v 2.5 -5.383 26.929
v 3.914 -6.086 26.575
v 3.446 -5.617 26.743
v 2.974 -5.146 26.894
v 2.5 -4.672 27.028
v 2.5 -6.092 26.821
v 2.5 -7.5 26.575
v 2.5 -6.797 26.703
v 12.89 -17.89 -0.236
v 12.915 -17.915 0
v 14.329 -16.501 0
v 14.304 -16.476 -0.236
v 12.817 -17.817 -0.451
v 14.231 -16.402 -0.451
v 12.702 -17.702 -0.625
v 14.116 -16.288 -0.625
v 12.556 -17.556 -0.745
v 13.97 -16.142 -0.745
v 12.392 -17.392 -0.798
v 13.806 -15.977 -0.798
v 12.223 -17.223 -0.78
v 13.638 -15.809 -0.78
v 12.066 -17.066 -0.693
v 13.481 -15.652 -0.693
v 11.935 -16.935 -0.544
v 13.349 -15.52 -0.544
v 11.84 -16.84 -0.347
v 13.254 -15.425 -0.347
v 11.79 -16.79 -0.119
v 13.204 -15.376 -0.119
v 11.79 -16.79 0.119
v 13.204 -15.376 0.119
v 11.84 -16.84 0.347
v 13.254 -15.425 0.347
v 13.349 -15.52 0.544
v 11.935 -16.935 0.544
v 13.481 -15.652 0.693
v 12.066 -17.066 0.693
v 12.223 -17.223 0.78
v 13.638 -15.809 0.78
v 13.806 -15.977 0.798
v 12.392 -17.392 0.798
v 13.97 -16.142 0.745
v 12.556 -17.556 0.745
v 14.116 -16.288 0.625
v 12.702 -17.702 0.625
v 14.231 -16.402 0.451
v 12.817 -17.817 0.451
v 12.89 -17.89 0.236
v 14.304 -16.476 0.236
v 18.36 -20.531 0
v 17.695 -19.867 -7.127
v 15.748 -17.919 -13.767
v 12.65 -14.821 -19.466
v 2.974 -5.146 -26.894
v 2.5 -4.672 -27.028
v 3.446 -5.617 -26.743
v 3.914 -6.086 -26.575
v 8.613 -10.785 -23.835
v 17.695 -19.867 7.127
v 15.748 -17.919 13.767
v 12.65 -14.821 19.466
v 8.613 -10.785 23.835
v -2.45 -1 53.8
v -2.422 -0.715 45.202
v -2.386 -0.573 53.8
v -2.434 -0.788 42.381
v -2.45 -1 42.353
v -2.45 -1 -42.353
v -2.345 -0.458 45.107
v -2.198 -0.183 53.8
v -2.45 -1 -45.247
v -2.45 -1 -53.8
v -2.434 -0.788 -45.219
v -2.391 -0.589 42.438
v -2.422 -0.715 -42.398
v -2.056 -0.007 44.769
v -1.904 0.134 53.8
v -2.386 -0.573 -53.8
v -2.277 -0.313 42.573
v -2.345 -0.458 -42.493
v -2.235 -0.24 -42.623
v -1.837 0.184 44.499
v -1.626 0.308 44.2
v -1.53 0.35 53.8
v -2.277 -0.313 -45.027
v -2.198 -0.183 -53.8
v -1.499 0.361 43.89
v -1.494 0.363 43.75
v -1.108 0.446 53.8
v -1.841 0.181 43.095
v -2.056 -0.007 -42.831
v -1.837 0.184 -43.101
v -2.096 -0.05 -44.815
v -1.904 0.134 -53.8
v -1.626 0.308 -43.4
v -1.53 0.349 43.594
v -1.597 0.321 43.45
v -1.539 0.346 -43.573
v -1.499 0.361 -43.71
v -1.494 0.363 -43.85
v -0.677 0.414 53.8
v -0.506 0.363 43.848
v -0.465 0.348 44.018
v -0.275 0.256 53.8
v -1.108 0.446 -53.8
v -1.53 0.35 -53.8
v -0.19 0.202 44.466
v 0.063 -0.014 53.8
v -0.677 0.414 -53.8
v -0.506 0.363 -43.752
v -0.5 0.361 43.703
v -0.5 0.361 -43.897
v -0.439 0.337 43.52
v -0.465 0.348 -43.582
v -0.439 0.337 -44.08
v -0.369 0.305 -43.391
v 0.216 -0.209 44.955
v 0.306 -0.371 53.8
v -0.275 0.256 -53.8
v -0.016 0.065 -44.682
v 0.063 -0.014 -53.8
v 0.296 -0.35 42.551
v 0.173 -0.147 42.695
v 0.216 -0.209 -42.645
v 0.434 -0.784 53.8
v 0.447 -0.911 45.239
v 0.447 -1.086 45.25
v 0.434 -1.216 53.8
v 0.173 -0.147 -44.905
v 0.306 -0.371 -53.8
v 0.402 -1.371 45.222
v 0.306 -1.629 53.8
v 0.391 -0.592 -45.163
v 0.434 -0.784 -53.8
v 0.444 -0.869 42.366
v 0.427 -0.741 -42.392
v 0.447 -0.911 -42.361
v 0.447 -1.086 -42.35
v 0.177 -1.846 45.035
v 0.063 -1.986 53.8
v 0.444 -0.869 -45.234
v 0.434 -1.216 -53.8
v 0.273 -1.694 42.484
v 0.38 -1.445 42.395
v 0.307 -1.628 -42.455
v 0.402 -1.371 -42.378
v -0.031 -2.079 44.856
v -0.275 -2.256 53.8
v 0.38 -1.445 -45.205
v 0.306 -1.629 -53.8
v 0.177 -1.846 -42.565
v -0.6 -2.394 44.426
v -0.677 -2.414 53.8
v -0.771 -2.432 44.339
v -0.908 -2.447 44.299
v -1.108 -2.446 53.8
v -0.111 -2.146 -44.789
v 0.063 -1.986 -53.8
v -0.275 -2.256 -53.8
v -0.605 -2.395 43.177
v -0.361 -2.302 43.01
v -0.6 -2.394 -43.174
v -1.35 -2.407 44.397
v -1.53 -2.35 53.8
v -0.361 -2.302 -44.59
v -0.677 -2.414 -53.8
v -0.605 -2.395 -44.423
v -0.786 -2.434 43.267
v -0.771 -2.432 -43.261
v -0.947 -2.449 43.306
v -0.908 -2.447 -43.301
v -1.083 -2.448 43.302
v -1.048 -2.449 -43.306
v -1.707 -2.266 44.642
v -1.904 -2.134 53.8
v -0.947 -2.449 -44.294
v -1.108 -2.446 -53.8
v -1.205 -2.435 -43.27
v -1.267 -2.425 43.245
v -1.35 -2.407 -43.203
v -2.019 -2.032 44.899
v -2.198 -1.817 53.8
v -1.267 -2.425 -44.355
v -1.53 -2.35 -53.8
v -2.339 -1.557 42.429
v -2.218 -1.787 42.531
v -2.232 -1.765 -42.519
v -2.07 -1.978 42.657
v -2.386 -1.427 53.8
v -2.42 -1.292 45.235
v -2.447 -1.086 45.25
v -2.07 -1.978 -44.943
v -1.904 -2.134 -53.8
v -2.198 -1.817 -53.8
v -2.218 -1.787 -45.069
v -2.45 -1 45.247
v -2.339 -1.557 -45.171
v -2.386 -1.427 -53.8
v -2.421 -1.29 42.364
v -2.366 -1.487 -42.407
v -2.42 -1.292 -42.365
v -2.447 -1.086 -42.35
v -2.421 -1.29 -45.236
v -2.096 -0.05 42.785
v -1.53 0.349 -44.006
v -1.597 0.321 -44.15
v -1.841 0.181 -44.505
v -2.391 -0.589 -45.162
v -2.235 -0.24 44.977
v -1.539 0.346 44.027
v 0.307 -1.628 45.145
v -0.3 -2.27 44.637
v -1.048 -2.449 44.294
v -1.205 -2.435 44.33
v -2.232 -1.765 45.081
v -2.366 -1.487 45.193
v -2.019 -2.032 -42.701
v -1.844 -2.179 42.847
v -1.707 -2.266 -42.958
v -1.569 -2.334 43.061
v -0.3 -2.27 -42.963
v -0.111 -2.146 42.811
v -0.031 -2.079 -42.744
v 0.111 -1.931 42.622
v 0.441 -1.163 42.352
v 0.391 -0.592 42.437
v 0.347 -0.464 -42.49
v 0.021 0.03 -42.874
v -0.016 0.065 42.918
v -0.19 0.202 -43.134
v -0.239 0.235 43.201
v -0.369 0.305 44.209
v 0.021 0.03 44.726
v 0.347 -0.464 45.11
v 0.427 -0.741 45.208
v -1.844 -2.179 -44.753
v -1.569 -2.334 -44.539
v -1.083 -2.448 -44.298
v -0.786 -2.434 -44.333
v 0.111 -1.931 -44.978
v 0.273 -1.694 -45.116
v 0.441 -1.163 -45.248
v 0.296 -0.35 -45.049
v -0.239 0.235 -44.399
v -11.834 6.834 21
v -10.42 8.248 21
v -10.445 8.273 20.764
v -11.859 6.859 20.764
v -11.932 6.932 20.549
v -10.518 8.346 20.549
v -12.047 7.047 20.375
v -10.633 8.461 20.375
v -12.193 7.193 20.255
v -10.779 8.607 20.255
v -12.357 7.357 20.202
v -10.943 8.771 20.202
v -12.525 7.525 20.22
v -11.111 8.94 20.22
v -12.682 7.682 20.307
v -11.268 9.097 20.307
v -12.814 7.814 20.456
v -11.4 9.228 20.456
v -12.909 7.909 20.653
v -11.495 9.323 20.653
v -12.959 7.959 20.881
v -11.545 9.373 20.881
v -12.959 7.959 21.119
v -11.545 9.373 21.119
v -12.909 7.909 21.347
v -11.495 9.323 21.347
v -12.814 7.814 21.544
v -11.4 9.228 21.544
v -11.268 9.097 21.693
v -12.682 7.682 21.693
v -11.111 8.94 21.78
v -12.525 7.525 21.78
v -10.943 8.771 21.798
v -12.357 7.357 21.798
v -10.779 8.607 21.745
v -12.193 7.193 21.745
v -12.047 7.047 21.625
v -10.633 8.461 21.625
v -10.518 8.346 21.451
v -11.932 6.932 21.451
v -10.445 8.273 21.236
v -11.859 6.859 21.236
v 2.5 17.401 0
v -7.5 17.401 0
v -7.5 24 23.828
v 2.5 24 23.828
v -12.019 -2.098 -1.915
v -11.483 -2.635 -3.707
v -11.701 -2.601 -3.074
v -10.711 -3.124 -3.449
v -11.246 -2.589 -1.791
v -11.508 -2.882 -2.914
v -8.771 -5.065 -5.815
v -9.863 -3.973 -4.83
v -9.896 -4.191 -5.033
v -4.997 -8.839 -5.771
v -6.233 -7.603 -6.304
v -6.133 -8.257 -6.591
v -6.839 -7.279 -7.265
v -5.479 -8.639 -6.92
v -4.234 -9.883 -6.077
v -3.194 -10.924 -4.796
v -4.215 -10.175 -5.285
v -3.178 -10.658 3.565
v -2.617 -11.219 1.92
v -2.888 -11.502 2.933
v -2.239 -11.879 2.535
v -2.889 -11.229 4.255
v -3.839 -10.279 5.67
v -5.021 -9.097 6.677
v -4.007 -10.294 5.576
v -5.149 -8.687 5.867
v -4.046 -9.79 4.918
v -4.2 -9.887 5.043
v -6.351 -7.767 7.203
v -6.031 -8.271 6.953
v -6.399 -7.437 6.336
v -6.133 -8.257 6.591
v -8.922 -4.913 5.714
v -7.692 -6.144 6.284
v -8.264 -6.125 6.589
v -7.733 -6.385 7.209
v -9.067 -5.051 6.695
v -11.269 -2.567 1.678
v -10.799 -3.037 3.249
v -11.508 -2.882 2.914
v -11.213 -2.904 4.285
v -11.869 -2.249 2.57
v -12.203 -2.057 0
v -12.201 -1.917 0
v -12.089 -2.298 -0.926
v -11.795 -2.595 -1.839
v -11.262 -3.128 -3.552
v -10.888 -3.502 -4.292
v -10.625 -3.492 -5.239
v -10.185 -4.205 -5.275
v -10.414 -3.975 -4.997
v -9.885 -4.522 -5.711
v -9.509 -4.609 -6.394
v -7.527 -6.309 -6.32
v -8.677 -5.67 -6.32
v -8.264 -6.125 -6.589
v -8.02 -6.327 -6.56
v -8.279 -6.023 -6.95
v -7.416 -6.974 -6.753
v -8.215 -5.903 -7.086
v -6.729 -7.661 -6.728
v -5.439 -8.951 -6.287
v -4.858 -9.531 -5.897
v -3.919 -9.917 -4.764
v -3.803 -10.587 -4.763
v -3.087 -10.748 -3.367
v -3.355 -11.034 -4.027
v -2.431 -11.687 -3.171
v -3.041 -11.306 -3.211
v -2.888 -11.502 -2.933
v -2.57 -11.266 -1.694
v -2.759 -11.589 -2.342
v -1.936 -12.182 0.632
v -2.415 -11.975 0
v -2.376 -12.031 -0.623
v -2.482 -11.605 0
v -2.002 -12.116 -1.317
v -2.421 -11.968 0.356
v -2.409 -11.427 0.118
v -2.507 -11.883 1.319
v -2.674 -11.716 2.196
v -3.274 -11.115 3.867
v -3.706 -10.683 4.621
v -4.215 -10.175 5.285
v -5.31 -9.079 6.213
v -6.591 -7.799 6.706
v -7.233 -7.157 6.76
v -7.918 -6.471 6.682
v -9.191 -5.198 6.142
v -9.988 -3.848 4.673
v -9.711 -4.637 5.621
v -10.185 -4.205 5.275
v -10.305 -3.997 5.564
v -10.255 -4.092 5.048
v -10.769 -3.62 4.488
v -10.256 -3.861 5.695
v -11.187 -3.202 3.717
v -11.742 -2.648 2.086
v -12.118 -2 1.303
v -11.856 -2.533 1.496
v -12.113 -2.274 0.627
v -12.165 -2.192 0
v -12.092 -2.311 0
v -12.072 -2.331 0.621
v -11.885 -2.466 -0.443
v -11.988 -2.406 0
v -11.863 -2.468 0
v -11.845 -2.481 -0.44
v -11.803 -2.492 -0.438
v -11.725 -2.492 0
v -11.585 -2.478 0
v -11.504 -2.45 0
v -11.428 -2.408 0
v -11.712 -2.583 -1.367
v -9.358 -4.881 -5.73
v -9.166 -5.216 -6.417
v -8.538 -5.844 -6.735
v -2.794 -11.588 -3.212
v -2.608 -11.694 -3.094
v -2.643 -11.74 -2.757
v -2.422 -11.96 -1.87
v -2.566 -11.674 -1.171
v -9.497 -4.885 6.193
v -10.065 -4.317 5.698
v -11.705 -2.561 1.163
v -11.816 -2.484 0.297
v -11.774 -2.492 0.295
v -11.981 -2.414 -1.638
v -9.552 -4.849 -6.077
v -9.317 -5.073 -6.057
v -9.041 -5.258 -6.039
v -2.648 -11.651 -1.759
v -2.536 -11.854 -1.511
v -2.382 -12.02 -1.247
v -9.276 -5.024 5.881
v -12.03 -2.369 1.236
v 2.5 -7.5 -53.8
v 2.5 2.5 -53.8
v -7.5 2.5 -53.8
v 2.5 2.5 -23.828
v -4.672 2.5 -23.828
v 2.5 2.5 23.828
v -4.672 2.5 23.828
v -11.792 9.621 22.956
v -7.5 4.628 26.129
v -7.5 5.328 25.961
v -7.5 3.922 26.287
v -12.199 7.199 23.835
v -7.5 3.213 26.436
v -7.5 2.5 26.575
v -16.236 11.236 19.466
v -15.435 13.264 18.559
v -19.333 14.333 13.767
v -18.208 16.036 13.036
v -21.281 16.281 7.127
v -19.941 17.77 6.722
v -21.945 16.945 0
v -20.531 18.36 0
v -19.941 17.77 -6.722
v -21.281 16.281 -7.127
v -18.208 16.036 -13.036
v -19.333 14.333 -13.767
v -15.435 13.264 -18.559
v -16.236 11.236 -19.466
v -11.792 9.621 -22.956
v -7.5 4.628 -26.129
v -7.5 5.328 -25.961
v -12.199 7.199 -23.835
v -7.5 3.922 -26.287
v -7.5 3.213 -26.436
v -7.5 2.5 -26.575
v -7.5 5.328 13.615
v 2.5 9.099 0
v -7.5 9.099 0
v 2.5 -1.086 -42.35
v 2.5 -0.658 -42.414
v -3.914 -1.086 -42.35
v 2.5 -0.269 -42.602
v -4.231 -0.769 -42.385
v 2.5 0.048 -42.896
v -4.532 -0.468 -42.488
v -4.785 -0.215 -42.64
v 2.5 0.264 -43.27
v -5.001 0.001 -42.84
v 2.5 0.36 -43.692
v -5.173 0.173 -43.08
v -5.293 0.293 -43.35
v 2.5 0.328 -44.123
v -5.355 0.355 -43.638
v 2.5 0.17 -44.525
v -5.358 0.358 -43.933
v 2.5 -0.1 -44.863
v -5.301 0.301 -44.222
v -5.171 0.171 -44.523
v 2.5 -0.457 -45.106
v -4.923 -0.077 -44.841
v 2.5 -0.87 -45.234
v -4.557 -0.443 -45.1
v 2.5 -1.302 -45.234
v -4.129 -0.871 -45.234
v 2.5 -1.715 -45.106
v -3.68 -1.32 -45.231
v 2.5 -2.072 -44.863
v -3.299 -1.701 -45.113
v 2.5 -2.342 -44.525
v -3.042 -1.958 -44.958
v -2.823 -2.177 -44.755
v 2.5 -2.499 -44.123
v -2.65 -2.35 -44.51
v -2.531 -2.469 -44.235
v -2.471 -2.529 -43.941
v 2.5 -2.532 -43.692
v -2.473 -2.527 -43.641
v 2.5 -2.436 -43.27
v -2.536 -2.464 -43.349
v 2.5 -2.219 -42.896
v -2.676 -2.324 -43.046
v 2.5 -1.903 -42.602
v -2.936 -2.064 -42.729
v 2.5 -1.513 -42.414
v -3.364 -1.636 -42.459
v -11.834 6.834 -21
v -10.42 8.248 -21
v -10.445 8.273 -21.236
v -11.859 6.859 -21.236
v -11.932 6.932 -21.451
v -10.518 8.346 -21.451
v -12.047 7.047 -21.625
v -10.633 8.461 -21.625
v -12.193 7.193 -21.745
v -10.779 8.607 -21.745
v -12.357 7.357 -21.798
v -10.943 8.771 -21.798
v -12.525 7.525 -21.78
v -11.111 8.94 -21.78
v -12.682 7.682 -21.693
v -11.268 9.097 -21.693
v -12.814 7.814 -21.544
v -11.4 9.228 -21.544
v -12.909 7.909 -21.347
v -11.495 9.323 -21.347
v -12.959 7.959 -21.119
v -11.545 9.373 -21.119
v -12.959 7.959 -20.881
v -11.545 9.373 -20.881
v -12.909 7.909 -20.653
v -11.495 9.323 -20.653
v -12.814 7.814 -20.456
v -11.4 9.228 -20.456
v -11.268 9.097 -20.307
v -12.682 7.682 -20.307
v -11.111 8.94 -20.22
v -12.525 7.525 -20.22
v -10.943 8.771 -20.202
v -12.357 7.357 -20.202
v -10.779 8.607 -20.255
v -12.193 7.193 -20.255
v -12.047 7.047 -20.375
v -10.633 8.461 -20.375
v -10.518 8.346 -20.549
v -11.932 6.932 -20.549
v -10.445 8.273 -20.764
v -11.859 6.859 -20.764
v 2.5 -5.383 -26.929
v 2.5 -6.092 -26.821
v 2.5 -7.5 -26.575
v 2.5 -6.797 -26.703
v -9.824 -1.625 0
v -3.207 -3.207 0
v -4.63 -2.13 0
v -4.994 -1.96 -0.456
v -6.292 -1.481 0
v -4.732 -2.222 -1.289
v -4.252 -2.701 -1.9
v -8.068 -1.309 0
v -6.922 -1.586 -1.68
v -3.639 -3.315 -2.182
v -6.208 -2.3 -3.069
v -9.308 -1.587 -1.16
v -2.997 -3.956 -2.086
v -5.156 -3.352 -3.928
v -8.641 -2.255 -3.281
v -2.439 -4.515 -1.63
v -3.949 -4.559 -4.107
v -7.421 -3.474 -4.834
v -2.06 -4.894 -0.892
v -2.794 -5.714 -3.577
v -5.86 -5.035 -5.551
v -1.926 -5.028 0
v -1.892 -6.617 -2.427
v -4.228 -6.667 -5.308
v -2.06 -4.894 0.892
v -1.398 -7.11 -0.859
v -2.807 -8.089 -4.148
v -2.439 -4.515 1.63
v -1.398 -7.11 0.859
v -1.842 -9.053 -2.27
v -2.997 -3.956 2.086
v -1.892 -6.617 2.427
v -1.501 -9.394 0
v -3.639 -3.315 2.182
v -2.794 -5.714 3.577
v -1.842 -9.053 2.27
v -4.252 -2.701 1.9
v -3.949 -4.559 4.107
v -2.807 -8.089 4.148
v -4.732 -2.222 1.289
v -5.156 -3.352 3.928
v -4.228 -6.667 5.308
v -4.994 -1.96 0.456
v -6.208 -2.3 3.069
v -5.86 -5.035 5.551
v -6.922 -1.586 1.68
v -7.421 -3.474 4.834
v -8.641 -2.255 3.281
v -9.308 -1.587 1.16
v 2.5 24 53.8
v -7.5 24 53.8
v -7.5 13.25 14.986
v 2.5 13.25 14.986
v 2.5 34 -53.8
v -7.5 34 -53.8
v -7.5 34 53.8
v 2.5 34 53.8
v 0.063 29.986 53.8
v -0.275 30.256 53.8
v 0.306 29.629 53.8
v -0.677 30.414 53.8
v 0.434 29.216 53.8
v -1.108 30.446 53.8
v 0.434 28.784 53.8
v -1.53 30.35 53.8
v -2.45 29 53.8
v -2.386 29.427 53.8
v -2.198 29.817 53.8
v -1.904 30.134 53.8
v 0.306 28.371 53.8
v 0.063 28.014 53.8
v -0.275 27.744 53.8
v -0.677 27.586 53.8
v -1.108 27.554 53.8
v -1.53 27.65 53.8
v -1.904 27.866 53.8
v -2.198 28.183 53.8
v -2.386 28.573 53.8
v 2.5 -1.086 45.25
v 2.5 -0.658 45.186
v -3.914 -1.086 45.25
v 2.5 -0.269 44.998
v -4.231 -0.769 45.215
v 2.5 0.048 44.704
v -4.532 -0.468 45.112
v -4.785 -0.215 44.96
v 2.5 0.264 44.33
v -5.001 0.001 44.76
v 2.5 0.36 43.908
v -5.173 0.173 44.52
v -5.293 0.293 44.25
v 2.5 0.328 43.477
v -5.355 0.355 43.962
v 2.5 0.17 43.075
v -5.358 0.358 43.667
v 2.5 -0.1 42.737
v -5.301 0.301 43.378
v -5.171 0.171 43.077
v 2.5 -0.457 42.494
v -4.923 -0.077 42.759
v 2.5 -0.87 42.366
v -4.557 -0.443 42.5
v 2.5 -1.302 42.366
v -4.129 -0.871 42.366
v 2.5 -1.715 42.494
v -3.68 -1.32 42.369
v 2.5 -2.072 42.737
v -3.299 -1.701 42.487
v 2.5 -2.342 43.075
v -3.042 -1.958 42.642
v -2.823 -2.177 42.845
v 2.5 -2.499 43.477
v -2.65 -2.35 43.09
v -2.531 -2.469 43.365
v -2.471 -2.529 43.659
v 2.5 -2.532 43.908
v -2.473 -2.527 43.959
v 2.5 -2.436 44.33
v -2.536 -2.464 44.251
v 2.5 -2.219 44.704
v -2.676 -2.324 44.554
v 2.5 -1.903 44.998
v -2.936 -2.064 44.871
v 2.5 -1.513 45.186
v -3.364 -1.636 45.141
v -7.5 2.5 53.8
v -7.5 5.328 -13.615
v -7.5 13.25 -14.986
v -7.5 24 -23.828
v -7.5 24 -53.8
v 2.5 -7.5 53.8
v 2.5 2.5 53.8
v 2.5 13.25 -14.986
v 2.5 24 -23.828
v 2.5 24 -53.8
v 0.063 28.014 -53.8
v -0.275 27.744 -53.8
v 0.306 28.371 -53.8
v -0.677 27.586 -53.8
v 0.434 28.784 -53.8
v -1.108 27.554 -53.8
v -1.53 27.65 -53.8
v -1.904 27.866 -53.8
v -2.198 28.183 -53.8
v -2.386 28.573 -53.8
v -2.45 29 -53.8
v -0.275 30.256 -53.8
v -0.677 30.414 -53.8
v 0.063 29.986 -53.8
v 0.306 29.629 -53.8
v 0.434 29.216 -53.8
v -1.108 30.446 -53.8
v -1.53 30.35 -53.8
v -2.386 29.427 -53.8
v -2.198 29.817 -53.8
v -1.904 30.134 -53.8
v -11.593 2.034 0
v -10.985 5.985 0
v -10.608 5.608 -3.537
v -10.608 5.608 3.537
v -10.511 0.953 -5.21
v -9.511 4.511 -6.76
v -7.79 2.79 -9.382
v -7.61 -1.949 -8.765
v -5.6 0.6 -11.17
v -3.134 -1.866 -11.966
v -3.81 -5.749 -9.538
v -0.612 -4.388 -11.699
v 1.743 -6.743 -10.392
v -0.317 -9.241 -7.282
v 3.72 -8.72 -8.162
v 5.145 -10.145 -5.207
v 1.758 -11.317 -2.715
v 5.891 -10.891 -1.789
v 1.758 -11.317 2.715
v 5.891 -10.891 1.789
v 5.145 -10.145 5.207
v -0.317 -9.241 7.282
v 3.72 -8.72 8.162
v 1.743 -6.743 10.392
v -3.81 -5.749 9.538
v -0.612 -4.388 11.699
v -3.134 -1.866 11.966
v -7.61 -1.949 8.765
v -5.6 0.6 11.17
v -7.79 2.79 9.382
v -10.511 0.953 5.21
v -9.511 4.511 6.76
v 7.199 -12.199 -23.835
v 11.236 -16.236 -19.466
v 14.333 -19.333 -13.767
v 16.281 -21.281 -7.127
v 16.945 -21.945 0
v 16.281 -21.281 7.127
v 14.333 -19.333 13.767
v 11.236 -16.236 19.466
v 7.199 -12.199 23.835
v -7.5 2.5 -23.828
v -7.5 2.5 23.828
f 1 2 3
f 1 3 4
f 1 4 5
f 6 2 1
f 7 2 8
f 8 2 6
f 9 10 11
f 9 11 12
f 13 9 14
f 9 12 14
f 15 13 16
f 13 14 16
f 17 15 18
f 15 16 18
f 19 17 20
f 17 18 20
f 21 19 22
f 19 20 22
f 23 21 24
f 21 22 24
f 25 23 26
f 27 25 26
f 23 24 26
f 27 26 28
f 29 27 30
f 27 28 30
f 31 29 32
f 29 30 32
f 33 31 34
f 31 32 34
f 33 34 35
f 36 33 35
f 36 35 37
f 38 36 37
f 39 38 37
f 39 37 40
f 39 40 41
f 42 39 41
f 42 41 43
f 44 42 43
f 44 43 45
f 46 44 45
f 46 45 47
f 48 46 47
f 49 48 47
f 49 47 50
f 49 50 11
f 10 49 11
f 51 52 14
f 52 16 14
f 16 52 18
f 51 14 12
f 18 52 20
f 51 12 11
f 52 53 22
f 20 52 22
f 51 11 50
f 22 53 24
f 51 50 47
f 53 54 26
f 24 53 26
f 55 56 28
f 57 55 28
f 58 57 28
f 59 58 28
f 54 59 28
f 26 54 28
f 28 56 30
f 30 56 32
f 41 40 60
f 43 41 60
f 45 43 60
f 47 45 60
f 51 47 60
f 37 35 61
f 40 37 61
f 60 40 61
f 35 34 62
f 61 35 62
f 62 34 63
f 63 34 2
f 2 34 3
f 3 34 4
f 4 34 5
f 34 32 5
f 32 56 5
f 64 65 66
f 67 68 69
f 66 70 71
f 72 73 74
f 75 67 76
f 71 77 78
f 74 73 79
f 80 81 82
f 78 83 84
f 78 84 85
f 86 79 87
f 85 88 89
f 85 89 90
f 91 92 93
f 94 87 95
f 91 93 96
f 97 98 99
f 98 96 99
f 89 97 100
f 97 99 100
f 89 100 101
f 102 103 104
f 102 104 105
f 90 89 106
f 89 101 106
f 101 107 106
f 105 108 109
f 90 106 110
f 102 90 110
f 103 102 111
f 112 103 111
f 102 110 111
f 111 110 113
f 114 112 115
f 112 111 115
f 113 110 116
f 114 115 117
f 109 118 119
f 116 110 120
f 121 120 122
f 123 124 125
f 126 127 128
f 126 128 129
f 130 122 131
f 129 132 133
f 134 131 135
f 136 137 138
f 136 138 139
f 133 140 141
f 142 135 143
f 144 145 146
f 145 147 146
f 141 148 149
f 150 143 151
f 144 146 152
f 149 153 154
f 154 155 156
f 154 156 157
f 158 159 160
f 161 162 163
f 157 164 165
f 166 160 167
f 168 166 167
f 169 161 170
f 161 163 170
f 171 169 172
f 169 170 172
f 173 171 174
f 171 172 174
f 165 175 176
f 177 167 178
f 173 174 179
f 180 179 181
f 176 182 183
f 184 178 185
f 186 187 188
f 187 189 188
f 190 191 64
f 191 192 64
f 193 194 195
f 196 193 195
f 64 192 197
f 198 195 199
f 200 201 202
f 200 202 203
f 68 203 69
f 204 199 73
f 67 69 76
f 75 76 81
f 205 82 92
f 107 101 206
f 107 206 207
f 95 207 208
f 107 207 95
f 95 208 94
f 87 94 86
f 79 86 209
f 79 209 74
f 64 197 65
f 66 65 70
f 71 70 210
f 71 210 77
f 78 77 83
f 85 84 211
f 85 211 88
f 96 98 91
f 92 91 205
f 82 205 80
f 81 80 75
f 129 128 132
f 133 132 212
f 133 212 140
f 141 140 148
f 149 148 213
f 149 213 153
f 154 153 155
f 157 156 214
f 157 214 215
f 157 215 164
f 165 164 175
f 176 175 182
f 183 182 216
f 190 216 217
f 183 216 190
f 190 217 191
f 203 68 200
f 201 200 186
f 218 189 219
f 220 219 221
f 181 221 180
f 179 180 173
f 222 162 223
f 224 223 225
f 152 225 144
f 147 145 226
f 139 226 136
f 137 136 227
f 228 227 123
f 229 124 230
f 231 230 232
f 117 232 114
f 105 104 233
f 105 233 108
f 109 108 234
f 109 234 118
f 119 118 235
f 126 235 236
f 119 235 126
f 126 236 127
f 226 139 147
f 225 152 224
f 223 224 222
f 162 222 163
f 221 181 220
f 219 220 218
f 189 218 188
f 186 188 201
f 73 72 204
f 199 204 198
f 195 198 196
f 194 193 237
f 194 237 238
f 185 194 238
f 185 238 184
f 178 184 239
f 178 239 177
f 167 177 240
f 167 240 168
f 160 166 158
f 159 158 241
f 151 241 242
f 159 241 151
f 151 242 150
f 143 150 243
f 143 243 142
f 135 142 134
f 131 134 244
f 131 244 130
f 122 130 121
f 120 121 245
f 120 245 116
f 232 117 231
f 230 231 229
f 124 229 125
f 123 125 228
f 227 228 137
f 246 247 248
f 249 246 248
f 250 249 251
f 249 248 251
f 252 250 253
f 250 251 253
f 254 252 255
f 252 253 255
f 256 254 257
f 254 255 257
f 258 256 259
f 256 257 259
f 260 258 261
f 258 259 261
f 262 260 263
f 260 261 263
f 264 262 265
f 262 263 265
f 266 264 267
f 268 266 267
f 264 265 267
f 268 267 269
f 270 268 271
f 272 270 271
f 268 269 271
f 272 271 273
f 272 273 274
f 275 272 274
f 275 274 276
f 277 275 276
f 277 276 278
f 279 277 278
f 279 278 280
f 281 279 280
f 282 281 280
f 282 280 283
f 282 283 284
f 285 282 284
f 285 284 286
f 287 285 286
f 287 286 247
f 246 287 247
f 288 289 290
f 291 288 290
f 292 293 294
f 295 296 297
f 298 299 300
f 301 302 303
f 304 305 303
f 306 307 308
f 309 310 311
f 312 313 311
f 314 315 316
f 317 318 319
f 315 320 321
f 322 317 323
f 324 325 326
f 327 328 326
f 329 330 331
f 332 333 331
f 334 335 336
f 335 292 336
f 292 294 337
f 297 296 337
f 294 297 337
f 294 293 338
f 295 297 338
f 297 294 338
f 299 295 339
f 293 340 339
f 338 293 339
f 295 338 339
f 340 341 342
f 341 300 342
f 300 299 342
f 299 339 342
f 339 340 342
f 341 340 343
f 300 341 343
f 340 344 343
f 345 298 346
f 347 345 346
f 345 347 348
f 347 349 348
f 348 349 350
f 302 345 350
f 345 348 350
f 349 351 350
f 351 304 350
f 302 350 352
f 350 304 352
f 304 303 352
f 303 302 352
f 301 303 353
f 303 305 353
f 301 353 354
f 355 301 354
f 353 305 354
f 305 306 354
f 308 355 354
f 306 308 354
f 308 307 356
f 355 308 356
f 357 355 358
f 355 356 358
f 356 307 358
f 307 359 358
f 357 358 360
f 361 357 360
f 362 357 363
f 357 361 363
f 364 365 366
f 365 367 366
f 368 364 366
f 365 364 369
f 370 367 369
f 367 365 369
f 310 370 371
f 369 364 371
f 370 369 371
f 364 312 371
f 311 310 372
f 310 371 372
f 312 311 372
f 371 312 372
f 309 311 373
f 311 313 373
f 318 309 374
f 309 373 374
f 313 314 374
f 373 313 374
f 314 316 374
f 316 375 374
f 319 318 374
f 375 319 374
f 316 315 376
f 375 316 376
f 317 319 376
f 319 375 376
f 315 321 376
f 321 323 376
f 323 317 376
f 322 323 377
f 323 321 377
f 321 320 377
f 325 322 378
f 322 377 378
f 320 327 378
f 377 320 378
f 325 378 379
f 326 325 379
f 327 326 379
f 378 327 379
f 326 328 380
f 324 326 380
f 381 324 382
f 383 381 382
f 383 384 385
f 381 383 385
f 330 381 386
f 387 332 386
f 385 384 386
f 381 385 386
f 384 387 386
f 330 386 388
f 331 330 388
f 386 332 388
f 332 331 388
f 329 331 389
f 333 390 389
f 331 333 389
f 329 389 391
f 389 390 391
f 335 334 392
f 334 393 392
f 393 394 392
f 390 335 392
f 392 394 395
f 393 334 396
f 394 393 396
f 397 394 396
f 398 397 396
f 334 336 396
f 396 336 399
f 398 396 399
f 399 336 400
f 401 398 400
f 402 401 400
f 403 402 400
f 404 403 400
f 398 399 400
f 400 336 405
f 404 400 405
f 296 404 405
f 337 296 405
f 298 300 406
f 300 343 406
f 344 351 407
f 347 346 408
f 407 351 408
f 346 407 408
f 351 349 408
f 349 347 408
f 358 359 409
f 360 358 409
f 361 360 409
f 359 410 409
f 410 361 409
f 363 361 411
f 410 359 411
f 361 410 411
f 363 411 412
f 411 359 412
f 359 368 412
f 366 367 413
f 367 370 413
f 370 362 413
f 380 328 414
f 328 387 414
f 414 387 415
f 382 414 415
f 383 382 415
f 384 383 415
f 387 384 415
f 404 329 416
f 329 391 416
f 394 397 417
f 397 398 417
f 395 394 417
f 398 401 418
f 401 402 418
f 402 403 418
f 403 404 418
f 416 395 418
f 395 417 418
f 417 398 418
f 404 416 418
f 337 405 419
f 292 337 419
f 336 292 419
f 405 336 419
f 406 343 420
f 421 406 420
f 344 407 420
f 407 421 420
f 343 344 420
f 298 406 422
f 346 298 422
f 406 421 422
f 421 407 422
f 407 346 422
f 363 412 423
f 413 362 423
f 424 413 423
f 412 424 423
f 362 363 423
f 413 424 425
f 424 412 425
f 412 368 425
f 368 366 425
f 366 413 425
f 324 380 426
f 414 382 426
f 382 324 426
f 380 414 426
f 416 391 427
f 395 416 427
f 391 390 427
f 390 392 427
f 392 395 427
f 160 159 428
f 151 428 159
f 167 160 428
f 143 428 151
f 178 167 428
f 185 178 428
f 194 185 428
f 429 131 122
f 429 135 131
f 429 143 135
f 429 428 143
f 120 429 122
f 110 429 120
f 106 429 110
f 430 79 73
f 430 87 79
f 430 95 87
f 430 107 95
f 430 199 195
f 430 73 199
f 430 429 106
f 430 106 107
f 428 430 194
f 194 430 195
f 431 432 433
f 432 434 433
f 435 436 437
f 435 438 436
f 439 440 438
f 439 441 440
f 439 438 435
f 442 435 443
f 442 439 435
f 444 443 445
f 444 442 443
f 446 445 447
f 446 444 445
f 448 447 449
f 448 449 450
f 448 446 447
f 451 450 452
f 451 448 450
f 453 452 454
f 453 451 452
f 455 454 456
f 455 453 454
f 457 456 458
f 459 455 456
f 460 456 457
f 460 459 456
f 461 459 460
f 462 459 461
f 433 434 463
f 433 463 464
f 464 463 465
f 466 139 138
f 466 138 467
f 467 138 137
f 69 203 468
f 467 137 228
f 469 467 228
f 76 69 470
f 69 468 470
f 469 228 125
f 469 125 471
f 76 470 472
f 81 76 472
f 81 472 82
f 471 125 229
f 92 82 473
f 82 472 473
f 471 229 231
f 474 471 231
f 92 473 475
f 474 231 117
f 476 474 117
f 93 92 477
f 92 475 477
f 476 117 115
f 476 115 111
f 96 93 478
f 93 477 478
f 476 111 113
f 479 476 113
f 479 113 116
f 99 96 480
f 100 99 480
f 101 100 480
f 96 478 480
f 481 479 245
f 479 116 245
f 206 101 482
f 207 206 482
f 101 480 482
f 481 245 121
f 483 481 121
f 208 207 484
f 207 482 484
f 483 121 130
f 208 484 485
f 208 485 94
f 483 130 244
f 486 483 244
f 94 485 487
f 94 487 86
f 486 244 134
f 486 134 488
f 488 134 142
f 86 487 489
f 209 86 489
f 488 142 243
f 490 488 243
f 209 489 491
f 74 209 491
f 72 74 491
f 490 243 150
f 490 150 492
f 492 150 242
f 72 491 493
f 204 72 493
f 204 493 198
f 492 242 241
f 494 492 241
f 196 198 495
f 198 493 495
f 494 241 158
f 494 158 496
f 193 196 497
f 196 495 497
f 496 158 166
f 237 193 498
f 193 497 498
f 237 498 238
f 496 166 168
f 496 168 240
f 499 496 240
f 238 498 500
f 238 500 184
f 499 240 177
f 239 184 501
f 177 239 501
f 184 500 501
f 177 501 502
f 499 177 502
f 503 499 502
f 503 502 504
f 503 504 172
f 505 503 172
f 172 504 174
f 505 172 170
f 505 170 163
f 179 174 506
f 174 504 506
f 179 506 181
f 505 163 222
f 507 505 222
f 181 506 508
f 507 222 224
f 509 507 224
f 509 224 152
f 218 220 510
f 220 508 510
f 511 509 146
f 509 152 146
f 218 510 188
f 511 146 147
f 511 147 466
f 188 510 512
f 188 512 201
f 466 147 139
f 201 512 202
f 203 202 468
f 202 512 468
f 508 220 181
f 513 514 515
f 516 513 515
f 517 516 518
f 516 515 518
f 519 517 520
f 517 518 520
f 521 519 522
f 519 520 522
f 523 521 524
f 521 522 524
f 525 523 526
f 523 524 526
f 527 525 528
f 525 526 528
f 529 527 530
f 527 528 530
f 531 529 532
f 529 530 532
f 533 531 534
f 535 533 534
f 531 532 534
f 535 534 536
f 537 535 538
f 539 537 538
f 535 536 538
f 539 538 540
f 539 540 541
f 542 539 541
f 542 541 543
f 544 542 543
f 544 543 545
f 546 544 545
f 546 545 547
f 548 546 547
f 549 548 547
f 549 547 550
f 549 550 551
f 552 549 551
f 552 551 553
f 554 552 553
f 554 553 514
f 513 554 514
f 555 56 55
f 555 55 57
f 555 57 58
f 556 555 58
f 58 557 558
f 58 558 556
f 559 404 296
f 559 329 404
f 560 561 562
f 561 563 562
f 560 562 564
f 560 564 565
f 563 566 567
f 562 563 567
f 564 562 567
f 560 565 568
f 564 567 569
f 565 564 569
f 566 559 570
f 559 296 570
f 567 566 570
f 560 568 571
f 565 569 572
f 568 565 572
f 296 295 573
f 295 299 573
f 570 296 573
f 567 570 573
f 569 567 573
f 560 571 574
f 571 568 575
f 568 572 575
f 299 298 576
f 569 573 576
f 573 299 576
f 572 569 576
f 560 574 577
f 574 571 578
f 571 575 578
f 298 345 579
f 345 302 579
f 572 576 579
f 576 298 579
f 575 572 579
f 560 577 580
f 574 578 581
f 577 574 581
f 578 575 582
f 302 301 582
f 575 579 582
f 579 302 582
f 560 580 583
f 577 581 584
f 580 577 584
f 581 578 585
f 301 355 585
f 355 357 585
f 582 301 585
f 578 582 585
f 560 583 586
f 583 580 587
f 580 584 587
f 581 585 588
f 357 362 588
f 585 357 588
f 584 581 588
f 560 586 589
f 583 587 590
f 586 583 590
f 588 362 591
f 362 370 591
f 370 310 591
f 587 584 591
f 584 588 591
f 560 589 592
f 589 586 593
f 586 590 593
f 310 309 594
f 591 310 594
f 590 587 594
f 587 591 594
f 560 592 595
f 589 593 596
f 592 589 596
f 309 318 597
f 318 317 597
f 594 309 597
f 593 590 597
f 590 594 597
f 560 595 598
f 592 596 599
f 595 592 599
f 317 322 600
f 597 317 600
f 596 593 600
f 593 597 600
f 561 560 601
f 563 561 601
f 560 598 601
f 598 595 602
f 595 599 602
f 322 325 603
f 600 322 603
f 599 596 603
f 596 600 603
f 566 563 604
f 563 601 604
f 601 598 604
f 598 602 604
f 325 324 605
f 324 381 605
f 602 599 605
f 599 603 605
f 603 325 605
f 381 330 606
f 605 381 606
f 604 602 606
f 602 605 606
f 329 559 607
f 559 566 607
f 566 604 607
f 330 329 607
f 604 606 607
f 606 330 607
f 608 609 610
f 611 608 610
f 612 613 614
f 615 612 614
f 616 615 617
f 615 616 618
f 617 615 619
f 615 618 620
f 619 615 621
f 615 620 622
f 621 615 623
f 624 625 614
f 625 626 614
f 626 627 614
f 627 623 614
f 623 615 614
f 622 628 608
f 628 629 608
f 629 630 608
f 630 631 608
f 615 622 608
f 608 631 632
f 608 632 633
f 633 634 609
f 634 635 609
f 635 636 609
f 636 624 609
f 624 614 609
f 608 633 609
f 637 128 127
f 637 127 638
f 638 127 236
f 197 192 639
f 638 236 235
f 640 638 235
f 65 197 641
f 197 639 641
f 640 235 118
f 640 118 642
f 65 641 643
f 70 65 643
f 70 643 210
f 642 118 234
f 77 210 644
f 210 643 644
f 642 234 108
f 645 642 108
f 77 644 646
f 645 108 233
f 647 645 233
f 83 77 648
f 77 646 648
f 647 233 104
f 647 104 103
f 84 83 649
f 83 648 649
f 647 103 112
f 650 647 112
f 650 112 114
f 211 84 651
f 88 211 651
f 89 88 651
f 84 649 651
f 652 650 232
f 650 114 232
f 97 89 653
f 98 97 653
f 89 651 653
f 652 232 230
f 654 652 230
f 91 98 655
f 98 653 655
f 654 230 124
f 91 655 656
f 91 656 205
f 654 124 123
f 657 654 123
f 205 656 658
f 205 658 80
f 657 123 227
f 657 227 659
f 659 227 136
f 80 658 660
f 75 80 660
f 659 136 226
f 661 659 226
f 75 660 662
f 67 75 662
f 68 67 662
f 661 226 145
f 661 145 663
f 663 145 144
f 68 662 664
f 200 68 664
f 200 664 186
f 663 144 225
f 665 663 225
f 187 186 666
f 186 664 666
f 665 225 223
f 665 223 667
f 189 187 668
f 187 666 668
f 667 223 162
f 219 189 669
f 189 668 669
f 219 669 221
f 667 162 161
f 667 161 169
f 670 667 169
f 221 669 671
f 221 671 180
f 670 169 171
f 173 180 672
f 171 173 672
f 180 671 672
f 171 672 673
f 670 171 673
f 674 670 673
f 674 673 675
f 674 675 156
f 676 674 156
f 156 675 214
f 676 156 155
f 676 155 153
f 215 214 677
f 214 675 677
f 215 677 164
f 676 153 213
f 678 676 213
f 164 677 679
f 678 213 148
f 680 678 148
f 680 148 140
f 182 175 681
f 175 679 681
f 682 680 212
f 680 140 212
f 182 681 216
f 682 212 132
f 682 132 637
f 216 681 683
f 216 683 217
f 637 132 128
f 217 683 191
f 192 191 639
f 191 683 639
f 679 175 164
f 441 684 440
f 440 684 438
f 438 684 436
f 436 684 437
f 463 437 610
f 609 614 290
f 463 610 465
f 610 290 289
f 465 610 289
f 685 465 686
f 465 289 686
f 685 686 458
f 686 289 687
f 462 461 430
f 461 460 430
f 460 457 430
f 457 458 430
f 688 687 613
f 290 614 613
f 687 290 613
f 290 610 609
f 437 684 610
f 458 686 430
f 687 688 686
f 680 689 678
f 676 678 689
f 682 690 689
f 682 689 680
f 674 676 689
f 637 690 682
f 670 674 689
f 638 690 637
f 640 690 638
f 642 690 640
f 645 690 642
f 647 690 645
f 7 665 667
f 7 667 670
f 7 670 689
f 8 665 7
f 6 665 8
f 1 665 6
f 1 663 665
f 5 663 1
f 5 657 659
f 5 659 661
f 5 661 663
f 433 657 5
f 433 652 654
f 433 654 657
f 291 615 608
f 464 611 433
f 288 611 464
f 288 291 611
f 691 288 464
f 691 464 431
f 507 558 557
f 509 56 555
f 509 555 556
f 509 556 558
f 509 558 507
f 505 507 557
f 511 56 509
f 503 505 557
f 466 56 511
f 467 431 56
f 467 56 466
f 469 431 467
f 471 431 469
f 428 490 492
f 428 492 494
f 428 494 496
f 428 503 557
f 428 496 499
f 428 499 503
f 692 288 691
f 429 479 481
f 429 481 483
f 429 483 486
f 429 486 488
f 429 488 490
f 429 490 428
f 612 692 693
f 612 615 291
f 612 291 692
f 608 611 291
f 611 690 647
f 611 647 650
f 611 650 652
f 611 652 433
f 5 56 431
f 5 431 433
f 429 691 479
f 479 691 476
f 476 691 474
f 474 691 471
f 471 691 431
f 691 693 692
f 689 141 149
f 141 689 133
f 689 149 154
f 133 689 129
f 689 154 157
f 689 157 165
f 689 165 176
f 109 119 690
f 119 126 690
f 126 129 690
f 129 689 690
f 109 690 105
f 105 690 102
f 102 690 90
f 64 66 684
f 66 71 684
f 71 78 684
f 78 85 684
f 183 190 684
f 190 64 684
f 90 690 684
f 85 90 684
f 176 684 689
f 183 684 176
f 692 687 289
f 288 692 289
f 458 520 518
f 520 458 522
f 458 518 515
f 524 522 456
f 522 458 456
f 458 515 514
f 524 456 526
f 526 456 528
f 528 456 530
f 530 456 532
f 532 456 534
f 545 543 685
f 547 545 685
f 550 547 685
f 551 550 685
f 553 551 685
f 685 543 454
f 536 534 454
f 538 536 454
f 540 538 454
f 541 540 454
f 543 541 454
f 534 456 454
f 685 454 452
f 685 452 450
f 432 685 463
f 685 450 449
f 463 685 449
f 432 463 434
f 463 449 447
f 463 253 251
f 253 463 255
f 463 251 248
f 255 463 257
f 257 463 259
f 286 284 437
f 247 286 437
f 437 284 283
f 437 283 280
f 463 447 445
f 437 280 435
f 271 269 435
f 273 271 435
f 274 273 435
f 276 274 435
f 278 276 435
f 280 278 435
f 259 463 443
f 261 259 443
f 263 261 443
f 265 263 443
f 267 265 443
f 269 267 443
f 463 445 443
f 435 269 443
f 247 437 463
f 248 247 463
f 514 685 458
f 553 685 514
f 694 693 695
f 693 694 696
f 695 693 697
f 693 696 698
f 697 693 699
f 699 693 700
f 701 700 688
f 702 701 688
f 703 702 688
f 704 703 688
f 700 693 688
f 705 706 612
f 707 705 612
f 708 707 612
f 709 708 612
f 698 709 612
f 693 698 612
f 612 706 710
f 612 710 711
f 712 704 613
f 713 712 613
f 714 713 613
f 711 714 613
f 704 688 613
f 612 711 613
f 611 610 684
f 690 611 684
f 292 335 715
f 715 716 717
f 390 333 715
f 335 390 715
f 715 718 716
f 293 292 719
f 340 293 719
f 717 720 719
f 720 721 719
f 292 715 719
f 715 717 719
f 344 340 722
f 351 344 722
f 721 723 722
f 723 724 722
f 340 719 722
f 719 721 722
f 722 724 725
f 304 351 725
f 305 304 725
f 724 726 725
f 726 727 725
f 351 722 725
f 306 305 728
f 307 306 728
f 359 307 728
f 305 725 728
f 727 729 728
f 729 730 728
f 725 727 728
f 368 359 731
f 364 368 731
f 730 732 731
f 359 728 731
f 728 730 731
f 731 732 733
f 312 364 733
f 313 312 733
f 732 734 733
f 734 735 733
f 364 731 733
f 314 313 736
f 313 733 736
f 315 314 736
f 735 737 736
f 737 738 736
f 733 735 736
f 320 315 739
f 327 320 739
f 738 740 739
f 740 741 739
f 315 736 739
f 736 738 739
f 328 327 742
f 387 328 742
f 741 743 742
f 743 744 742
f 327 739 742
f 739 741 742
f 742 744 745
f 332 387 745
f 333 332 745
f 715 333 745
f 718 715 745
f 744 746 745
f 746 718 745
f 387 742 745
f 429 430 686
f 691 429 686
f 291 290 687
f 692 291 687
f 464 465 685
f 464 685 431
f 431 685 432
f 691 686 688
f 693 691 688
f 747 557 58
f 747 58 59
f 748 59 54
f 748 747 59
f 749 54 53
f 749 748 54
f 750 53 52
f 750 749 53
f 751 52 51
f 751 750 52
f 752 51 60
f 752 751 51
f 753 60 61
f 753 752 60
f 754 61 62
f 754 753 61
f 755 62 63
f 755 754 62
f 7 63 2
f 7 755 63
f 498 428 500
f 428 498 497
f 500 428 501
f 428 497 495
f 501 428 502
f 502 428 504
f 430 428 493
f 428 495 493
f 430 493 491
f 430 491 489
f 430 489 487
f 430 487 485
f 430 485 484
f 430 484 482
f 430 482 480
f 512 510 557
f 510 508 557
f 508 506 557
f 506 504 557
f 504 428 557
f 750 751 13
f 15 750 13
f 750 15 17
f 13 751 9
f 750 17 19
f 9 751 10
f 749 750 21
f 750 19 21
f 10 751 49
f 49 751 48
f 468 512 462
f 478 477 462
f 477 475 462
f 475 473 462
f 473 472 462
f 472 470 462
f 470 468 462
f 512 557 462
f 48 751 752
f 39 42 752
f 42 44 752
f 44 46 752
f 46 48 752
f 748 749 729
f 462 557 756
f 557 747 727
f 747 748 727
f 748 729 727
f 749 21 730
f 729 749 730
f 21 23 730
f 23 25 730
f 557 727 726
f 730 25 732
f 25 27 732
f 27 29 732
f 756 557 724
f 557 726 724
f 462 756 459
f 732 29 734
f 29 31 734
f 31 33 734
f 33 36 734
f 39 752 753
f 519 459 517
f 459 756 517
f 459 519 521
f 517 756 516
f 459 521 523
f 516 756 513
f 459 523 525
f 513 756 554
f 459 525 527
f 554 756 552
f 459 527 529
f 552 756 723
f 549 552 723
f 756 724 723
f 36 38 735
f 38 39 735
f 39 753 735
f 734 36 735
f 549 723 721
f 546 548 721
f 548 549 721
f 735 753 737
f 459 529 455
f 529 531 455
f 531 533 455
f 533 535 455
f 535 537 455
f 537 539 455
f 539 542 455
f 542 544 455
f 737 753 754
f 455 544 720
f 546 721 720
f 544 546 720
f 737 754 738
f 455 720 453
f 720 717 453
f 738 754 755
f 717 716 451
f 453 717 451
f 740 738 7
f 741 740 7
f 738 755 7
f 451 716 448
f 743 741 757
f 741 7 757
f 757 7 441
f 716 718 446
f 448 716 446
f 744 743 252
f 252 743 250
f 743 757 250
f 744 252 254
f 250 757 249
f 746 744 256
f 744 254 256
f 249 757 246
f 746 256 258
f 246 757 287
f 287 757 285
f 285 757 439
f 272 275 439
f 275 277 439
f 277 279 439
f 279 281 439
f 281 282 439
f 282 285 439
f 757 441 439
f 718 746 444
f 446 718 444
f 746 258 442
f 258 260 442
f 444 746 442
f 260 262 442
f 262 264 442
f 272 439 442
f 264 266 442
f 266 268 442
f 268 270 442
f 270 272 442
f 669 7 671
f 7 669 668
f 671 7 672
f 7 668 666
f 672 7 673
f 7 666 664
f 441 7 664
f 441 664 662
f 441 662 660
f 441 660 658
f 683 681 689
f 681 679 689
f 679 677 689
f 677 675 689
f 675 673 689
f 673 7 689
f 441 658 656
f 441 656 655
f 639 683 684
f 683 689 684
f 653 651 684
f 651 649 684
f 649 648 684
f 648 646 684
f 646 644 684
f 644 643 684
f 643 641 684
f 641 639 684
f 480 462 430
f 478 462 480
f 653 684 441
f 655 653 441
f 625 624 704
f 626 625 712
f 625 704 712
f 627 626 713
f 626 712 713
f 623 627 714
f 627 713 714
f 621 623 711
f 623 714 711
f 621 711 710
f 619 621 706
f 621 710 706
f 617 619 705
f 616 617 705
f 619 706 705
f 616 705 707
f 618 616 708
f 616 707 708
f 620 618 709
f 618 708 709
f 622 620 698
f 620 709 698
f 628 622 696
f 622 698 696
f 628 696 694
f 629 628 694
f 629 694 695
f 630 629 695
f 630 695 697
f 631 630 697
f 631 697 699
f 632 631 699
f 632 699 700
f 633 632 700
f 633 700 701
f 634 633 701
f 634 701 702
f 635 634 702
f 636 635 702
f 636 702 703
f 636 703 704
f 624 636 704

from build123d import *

# Parameters (mm, degrees)
MAIN_BODY_DEPTH        = 53.8
SKETCH4_W              = 35
SKETCH4_H              = 10.428932188
SKETCH4_H_2            = 14.142135624
BOSS_EXTRUDE2_DEPTH    = 2
M2X0_4_TAPPED_HOLE2_D  = 1.6
SIDE_HOLES_D           = 2.9
FILLET1_R              = 0.5
BOSS_EXTRUDE4_START    = -10
BOSS_EXTRUDE4_DEPTH    = 10
M2_5_CLEARANCE_HOLE1_D = 2.9
M2_5_CLEARANCE_HOLE2_D = 2.9


# Read off the part's stored shape, not the designer's step: Boss-Extrude4
with BuildPart() as part:
    # Sketch1 → Main Body (new, symmetric)
    with BuildSketch(Plane.XY):
        Polygon((-7.5, 2.5), (2.5, 2.5), (2.5, -7.5), align=None)
    extrude(amount=MAIN_BODY_DEPTH, both=True)

    # Sketch4 → Boss-Extrude2 (add)
    with BuildSketch(Plane(origin=(-2.5, -2.5, 0), x_dir=(0, 0, 1), z_dir=(-0.7071067811865474, -0.7071067811865477, 0))):
        with Locations((0, 12.285533906)):
            Rectangle(SKETCH4_W, SKETCH4_H)
        Rectangle(SKETCH4_W, SKETCH4_H_2)
        with Locations((0, -12.285533906)):
            Rectangle(SKETCH4_W, SKETCH4_H)
        with BuildLine():
            Line((-17.5, -17.5), (-17.5, -7.071067812))
            Line((-17.5, -7.071067812), (-26.575364532, -7.071067812))
            ThreePointArc((-26.575364532, -7.071067812), (0, -27.5), (26.575364532, -7.071067812))
            Line((26.575364532, -7.071067812), (17.5, -7.071067812))
            Line((17.5, -7.071067812), (17.5, -17.5))
            Line((17.5, -17.5), (-17.5, -17.5))
        make_face()
        with BuildLine():
            Line((-17.5, -7.071067812), (-17.5, 7.071067812))
            Line((-17.5, 7.071067812), (-26.575364532, 7.071067812))
            ThreePointArc((-26.575364532, 7.071067812), (-27.5, 0), (-26.575364532, -7.071067812))
            Line((-26.575364532, -7.071067812), (-17.5, -7.071067812))
        make_face()
        with BuildLine():
            Line((-17.5, 7.071067812), (-17.5, 17.5))
            Line((-17.5, 17.5), (17.5, 17.5))
            Line((17.5, 17.5), (17.5, 7.071067812))
            Line((17.5, 7.071067812), (26.575364532, 7.071067812))
            ThreePointArc((26.575364532, 7.071067812), (0, 27.5), (-26.575364532, 7.071067812))
            Line((-26.575364532, 7.071067812), (-17.5, 7.071067812))
        make_face()
        with BuildLine():
            Line((26.575364532, 7.071067812), (17.5, 7.071067812))
            Line((17.5, 7.071067812), (17.5, -7.071067812))
            Line((17.5, -7.071067812), (26.575364532, -7.071067812))
            ThreePointArc((26.575364532, -7.071067812), (27.267861345, -3.565632859), (27.5, 0))
            ThreePointArc((27.5, 0), (27.267861345, 3.565632859), (26.575364532, 7.071067812))
        make_face()
    extrude(amount=-BOSS_EXTRUDE2_DEPTH)

    # M2x0.4 Tapped Hole2 (through all)
    with Locations(Plane(origin=(-2.5, -2.5, 0), x_dir=(-0.7071067811865477, 0.7071067811865474, 0), z_dir=(-0.7071067811865474, -0.7071067811865477, 0))):
        with Locations((-21, 0), (14, 21), (14, -21)):
            Hole(M2X0_4_TAPPED_HOLE2_D / 2)

    # Side holes (through all)
    with Locations(Plane.XY.offset(53.8)):
        with Locations((-1, -1)):
            Hole(SIDE_HOLES_D / 2)

    # Sketch8 → Revolve1 (revolve)
    with BuildSketch(Plane(origin=(0, 0, 0), x_dir=(0, 0, 1), z_dir=(0.7071067811865476, -0.7071067811865476, 0)), mode=Mode.PRIVATE) as revolve1_sk:
        with BuildLine():
            Line((0, 3.535533906), (0, 4.535533906))
            ThreePointArc((0, 4.535533906), (-4.596194078, 6.439339828), (-6.5, 11.035533906))
            Line((-6.5, 11.035533906), (-12, 3.535533906))
            Line((-12, 3.535533906), (0, 3.535533906))
        make_face()
    revolve(revolve1_sk.sketch.rotate(Axis((-2.5, -2.5, 0), (-0.7071067811865476, -0.7071067811865476, 0)), 270), axis=Axis((-2.5, -2.5, 0), (-0.7071067811865476, -0.7071067811865476, 0)))

    # Fillet1
    fillet1_edges = [part.edges().sort_by_distance(p)[0] for p in [
        (-3.207106781, -12.399494937, 0),
    ]]
    fillet(fillet1_edges, radius=FILLET1_R)

    # Boss-Extrude4 outline → Boss-Extrude4 (add)
    with BuildSketch(Plane(origin=(2.5, 0, 0), x_dir=(0, 0, -1), z_dir=(1, 0, 0)).offset(BOSS_EXTRUDE4_START)):
        Polygon((53.8, 33.99997125), (-53.8, 33.99997125), (-53.8, 23.99997125), (-14.986093738, 13.249985625), (-53.8, 2.5), (-23.827812525, 2.5), (0, 9.099403842), (23.827812525, 2.5), (53.8, 2.5), (14.986093738, 13.249985625), (53.8, 23.99997125), align=None)
        Polygon((23.827812525, 23.99997125), (0, 17.400567408), (-23.827812525, 23.99997125), align=None, mode=Mode.SUBTRACT)
    extrude(amount=BOSS_EXTRUDE4_DEPTH)

    # M2.5 Clearance Hole1 (through all)
    with Locations(Plane.XY.offset(53.8)):
        with Locations((-1, 28.99997125)):
            Hole(M2_5_CLEARANCE_HOLE1_D / 2)

    # M2.5 Clearance Hole2 (through all)
    with Locations(Plane(origin=(2.5, 0, 0), x_dir=(0, 0, -1), z_dir=(1, 0, 0))):
        with Locations((-43.8, -1.085786438), (43.8, -1.085786438)):
            Hole(M2_5_CLEARANCE_HOLE2_D / 2)


solid = part.part
